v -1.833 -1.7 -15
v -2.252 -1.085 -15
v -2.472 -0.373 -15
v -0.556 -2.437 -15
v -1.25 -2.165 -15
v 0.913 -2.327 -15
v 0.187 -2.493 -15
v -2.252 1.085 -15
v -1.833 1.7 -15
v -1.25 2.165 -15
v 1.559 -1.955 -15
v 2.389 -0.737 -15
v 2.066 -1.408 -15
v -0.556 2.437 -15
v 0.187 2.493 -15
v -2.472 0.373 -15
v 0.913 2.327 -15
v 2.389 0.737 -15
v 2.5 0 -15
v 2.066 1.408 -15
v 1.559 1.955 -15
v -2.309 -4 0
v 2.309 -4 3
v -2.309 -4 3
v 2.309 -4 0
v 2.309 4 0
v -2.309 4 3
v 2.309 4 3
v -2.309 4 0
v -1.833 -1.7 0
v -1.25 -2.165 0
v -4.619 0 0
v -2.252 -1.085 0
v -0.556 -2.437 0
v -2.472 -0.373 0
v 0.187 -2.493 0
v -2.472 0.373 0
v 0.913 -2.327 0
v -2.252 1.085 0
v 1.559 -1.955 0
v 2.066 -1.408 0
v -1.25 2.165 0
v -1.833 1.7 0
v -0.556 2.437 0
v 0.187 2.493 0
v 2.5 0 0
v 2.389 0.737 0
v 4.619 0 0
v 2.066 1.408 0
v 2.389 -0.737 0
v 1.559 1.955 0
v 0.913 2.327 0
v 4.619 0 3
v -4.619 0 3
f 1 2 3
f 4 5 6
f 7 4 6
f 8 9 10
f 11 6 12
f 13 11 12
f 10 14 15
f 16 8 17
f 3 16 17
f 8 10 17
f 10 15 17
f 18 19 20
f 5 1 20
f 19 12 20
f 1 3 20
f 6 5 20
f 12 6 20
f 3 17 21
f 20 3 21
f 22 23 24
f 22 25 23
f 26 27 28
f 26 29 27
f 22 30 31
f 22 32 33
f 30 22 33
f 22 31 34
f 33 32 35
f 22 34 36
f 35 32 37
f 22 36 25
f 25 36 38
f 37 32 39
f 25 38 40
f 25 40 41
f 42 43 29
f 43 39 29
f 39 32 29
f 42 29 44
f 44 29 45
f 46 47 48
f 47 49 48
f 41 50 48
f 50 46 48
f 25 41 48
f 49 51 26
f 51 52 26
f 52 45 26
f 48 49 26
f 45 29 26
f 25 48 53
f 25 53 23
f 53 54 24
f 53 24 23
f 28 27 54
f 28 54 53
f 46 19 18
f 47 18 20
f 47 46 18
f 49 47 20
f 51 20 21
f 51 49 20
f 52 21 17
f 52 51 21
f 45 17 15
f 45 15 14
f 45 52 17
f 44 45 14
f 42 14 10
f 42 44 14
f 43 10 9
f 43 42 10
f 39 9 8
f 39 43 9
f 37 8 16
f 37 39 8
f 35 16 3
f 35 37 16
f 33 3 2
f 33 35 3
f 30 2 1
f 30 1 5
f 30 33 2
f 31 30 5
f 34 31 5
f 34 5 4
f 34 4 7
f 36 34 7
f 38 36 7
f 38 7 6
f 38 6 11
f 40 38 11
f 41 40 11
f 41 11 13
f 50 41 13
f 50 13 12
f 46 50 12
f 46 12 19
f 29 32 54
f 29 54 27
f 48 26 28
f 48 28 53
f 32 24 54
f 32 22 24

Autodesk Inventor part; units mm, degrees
ref_plane "YZ Plane" through (0, 0, 0) normal (1, 0, 0) x (0, 1, 0)
ref_plane "XZ Plane" through (0, 0, 0) normal (0, 1, 0) x (-1, 0, 0)
ref_plane "XY Plane" through (0, 0, 0) normal (0, 0, 1) x (1, 0, 0)
sketch "Эскиз1" plane through (0, 0, 0) normal (0, 0, 1) x (1, 0, 0)
  line L0 (2.3094, 4) -> (4.6188, 0)
  line L1 (4.6188, 0) -> (2.3094, -4)
  line L2 (2.3094, -4) -> (-2.3094, -4)
  line L3 (-2.3094, -4) -> (-4.6188, 0)
  line L4 (-4.6188, 0) -> (-2.3094, 4)
  line L5 (-2.3094, 4) -> (2.3094, 4)
  circle A0 centre (0, 0) radius 2.5
  dimension "d0" = 8
  dimension "d3" = 5
extrude "Выдавливание1" add sketch "Эскиз1" along normal blind 3 contours L0 L1 L2 L3 L4 L5 | A0
extrude "Выдавливание2" add sketch "Эскиз1" against normal blind 15 contours A0
thread "Резьба1" size "M5x0.8" class "6g" standard "ISO Metric profile" length 150
properties part number "Болт"
